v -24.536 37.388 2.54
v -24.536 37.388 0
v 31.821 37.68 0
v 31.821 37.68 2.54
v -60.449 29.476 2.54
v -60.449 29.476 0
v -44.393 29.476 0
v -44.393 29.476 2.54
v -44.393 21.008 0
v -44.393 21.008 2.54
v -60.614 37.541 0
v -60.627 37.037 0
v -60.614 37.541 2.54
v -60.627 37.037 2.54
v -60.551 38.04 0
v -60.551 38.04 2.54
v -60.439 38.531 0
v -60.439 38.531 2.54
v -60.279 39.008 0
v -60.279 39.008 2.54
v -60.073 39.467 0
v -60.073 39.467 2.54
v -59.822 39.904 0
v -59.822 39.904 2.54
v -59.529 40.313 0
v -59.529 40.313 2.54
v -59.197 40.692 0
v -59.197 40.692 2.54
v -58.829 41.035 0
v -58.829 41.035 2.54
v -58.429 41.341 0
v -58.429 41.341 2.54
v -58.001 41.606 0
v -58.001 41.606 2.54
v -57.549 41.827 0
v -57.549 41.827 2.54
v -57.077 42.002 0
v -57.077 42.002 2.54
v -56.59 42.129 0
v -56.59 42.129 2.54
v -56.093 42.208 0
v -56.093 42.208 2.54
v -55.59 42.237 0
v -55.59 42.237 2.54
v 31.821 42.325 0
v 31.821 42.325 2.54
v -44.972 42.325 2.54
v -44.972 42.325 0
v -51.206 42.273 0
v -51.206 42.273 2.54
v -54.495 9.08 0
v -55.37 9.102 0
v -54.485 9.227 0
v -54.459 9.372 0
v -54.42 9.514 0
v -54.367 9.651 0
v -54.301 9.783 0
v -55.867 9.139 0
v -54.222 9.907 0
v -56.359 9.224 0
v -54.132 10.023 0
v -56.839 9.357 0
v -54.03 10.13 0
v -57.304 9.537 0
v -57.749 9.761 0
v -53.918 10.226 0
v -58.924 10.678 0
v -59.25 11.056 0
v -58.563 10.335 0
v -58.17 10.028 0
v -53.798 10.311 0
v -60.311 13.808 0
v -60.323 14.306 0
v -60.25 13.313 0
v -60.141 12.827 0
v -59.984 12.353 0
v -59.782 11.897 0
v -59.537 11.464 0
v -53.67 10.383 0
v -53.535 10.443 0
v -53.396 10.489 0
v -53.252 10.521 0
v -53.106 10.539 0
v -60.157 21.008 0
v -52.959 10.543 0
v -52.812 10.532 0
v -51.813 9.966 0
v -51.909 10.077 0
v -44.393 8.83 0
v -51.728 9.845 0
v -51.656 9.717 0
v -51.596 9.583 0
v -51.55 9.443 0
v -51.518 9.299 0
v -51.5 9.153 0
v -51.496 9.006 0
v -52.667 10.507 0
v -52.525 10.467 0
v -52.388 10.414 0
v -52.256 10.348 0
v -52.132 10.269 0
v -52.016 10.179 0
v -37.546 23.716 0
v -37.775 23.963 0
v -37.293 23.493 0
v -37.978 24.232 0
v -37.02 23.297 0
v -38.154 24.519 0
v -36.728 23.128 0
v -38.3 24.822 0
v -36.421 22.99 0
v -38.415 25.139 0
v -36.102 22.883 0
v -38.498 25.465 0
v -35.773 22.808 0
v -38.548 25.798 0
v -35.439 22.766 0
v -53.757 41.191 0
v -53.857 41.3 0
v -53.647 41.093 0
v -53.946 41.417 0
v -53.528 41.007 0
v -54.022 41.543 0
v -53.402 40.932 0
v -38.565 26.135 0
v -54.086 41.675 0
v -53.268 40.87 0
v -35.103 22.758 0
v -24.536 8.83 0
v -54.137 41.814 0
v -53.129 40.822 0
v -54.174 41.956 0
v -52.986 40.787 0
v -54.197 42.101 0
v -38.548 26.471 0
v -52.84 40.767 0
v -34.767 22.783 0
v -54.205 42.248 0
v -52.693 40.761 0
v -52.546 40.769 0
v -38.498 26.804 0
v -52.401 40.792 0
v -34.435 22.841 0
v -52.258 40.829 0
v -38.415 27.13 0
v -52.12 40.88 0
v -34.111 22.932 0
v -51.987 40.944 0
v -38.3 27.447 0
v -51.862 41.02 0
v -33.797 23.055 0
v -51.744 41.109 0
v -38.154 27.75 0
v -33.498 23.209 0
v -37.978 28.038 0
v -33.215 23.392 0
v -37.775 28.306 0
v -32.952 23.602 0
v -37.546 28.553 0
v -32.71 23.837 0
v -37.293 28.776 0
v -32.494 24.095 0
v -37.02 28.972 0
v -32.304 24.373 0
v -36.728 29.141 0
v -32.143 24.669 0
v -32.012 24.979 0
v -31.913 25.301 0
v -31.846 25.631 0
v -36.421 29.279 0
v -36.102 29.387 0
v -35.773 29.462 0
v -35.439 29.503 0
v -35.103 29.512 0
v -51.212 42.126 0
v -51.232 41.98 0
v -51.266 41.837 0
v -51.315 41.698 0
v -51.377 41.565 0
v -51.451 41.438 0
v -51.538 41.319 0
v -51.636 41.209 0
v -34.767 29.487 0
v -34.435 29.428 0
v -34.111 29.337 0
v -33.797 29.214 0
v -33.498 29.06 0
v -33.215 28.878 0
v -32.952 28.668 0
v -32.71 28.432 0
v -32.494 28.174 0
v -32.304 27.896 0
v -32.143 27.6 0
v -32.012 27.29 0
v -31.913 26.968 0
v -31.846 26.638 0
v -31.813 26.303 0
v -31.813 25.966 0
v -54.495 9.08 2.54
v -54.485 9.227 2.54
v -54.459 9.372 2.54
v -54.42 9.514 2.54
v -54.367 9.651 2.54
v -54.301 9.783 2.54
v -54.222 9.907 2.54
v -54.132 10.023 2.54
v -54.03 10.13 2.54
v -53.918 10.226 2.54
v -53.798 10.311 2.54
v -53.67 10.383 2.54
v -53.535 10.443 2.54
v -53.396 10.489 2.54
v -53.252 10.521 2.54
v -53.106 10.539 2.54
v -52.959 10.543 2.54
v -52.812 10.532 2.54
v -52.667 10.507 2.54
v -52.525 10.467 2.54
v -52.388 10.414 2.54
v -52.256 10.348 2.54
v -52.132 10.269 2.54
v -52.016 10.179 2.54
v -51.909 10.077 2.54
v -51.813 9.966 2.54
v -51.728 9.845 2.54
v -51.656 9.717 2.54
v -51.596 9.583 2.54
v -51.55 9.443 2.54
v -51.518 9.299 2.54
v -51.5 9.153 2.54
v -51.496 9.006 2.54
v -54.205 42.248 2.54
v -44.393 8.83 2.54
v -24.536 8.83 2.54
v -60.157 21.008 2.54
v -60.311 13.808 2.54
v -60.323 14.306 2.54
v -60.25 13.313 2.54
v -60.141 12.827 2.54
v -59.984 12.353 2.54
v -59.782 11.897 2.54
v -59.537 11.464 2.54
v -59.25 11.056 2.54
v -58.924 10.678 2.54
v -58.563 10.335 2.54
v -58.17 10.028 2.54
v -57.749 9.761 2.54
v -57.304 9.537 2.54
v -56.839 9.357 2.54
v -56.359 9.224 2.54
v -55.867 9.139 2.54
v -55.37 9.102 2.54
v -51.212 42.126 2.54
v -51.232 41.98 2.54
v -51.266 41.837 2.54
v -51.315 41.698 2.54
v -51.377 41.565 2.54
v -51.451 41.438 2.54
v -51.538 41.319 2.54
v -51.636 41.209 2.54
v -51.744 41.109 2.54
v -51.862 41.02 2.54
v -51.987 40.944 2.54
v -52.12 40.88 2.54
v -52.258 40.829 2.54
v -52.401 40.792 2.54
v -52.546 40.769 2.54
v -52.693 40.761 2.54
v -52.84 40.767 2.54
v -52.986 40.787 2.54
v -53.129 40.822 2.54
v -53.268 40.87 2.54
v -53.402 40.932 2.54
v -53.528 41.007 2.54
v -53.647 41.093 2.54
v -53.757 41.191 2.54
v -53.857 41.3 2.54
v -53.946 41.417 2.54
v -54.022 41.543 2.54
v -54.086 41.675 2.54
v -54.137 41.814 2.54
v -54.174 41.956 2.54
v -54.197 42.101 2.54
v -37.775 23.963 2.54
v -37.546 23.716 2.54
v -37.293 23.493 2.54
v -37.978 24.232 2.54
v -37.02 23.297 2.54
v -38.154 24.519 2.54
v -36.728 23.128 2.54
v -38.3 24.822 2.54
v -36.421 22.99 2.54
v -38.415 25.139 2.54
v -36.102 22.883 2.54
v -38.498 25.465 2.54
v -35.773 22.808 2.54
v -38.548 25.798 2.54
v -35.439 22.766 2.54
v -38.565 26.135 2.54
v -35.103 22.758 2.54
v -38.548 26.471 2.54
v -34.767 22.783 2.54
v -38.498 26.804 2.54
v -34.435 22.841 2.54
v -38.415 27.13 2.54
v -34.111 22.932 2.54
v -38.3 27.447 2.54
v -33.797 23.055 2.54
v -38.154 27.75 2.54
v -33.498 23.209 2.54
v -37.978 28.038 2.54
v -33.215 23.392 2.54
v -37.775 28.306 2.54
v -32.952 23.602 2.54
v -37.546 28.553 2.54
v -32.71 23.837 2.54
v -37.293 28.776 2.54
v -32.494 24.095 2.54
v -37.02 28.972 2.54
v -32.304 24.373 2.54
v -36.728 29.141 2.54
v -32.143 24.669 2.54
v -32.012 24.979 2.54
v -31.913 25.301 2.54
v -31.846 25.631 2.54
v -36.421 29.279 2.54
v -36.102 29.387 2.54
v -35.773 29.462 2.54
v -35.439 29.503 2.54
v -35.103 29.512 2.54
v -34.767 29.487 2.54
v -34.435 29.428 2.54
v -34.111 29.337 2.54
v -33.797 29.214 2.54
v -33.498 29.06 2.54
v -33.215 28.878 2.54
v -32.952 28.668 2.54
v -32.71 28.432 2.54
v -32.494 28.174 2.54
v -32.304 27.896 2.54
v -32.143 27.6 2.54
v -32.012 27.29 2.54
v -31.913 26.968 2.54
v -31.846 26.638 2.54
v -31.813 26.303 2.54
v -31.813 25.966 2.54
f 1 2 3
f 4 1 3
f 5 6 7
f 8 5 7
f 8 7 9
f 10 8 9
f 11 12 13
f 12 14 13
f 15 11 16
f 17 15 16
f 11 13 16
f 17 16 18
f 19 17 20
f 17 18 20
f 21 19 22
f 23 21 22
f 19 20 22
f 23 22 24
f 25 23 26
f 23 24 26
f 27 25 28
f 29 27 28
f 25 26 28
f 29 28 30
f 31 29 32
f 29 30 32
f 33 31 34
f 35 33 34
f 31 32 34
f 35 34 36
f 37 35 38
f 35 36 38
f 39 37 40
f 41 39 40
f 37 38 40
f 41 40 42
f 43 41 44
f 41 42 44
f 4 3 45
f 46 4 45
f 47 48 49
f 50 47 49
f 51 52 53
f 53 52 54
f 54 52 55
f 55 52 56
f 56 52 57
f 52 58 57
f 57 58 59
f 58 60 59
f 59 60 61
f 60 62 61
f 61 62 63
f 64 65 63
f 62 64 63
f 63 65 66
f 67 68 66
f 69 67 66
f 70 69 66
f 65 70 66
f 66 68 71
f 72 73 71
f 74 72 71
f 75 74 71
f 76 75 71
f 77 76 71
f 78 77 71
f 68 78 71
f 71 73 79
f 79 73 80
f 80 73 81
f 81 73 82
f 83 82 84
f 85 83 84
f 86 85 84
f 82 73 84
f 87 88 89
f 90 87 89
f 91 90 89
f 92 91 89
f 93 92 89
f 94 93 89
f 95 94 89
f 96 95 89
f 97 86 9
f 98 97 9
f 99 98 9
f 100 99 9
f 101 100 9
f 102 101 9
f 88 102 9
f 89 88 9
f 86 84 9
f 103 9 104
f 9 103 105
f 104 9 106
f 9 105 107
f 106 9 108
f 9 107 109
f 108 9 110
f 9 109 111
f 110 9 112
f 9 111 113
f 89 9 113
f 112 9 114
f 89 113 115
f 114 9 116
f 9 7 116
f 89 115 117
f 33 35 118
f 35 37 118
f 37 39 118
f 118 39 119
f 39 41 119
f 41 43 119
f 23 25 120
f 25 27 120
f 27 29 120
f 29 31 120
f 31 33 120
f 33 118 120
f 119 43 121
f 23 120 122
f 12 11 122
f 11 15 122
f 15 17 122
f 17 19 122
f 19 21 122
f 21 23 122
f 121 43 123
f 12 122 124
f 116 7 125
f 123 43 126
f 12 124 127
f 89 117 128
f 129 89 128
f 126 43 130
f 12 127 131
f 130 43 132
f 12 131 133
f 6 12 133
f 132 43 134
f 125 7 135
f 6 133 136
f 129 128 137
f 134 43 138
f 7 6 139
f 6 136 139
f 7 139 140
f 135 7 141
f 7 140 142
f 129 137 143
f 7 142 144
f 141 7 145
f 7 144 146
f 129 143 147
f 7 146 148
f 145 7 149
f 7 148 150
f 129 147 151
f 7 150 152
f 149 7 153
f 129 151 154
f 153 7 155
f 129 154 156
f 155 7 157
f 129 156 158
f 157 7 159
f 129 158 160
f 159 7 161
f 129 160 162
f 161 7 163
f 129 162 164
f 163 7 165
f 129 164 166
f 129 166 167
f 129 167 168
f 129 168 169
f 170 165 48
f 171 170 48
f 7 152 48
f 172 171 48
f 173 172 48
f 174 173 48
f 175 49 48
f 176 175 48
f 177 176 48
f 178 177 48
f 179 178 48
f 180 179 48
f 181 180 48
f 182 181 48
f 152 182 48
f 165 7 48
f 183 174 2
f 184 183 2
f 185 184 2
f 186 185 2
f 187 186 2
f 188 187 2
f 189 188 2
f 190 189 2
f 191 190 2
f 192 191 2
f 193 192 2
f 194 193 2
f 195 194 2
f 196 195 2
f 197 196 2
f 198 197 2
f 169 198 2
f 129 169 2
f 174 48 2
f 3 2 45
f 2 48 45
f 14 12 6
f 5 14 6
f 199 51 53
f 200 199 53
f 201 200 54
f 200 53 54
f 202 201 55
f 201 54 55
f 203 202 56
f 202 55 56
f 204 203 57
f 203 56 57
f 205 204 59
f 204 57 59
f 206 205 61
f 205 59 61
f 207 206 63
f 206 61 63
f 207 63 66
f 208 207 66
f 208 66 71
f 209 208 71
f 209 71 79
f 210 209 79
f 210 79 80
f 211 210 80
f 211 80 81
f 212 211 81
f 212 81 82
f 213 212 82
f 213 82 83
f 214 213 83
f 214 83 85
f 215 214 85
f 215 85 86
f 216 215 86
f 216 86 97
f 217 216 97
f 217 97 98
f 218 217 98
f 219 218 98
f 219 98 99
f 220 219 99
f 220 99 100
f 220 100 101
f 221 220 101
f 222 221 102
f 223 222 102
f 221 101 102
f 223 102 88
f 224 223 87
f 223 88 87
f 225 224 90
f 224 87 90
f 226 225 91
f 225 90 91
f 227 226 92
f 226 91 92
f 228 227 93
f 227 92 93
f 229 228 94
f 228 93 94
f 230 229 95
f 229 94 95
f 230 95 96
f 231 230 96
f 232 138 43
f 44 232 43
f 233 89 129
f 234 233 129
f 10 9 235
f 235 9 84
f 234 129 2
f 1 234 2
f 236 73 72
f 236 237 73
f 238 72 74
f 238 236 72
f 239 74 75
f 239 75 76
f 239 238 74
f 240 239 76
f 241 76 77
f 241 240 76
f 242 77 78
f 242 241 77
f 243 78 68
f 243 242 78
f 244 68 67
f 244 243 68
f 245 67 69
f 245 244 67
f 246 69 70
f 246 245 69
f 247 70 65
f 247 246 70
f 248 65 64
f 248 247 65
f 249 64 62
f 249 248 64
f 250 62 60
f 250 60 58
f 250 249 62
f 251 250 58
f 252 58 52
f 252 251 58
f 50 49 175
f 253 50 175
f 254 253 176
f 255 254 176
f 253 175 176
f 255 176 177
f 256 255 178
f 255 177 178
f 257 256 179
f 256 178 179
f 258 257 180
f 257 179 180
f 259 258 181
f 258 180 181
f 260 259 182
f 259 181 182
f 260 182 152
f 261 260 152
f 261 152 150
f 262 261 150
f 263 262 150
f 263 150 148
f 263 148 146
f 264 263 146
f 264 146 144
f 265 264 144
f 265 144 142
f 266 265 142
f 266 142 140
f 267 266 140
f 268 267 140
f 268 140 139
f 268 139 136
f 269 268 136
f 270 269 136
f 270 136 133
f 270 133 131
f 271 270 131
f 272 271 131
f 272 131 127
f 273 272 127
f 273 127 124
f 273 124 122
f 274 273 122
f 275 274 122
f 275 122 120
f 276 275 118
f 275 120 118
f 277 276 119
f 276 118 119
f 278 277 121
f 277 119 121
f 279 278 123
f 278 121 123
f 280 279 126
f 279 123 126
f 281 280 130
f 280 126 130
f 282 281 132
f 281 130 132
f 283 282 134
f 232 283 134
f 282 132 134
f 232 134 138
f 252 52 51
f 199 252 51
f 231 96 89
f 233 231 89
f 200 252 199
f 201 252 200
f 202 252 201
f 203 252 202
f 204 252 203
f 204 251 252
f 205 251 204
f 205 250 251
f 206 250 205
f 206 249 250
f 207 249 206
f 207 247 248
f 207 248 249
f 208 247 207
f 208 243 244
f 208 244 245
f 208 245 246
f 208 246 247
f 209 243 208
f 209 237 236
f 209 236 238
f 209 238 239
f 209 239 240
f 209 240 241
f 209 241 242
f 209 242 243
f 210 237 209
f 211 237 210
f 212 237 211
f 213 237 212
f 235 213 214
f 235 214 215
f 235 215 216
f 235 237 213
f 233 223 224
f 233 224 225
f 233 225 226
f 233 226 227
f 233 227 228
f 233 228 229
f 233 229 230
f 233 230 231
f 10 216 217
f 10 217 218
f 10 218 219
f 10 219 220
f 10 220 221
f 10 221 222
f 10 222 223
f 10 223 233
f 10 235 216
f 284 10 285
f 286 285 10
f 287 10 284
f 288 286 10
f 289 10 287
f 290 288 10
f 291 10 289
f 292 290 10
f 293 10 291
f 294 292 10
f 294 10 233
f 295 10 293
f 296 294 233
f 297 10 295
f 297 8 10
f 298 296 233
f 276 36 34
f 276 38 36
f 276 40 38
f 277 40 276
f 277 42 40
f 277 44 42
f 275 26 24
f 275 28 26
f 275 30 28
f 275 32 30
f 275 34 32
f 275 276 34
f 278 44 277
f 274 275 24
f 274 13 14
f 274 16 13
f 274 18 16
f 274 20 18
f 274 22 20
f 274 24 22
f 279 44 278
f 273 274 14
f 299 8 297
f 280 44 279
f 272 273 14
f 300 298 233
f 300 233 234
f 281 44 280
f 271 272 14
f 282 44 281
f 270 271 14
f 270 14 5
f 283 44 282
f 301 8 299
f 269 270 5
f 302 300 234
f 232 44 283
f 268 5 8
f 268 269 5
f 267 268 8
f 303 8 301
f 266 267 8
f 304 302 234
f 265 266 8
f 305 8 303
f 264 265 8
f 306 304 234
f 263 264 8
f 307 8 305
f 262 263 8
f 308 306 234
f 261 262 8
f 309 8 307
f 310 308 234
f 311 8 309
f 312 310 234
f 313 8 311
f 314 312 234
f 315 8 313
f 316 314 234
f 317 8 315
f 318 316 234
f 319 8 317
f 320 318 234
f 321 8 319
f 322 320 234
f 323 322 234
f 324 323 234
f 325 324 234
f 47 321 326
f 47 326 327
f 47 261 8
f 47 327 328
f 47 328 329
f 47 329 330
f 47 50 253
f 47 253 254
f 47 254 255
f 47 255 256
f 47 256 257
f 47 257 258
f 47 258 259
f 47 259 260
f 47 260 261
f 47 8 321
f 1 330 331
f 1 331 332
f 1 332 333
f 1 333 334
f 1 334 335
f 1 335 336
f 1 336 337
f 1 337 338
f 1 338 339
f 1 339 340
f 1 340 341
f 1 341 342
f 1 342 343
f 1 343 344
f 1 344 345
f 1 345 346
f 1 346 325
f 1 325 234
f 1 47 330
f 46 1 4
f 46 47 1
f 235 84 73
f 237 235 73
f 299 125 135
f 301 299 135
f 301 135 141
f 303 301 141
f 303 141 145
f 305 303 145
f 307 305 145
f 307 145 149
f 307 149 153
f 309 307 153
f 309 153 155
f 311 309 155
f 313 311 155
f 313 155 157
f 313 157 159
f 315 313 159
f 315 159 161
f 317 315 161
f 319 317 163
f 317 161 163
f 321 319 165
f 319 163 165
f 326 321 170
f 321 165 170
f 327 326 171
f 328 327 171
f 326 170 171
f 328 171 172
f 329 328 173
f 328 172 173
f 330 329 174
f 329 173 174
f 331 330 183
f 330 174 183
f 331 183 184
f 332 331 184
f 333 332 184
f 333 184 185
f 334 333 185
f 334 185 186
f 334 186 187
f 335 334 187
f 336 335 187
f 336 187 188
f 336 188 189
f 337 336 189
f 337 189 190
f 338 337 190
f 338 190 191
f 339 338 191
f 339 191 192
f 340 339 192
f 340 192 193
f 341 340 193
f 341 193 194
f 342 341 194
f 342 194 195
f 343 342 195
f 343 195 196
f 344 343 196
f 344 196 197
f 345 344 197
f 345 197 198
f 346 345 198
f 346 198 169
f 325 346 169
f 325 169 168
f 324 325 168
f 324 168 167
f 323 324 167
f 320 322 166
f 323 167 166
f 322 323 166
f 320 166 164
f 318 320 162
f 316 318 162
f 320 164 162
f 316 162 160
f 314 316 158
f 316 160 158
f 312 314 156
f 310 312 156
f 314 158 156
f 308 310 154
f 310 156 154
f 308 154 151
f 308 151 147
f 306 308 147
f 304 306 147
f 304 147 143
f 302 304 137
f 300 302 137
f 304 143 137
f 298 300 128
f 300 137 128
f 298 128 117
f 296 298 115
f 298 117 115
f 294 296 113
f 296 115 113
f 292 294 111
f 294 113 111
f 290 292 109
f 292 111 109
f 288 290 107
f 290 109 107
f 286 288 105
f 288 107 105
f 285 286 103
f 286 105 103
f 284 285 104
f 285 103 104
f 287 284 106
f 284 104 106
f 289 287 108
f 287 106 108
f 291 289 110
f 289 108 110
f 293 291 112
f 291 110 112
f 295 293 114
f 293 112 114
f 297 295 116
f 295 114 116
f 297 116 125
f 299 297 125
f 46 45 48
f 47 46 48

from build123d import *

# Parameters (mm, degrees)
F1_DEPTH = 2.54
F4_D     = 6.7564
F5_R     = 5.08
F6_R     = 5.08
F9_D     = 3
F10_D    = 3


with BuildPart() as f1:
    # F0 (on Top) → F1 (new body)
    with BuildSketch(Plane.XY):
        Polygon((-26.9663626849, 16.0324431312), (-26.6666630804, 3.3142461729), (-10.6108812243, 3.3142461729), (-10.6108812243, -5.1539645243), (-26.3746562004, -5.1539645243), (-26.6666630804, -16.9342223267), (-10.6108812243, -17.3322101165), (9.2456126958, -17.3322101165), (9.2456126958, 11.2262545153), (65.6030206382, 11.518263258), (65.6030206382, 16.1625675214), (-11.1902779489, 16.1625675214), align=None)
    extrude(amount=F1_DEPTH)


with BuildPart() as f1_1:
    # F2: moved
    add(f1.part.moved(Location((-33.782, 26.162, 0))))

    # F4 (through all)
    with Locations(Plane.XY.offset(2.54)):
        with Locations((-35.1868793368, 26.1346530169)):
            Hole(F4_D / 2)

    # F5
    f5_edges = [f1_1.edges().sort_by_distance(p)[0] for p in [
        (-60.448663, 9.227778, 1.27),
    ]]
    fillet(f5_edges, radius=F5_R)

    # F6
    f6_edges = [f1_1.edges().sort_by_distance(p)[0] for p in [
        (-60.748363, 42.194443, 1.27),
    ]]
    fillet(f6_edges, radius=F6_R)

    # F9 (through all)
    with Locations(Plane.XY.offset(2.54)):
        with Locations((-52.7054518143, 42.2607827135)):
            Hole(F9_D / 2)

    # F10 (through all)
    with Locations(Plane.XY.offset(2.54)):
        with Locations((-52.9959336795, 9.0430407773)):
            Hole(F10_D / 2)


solid = f1_1.part
